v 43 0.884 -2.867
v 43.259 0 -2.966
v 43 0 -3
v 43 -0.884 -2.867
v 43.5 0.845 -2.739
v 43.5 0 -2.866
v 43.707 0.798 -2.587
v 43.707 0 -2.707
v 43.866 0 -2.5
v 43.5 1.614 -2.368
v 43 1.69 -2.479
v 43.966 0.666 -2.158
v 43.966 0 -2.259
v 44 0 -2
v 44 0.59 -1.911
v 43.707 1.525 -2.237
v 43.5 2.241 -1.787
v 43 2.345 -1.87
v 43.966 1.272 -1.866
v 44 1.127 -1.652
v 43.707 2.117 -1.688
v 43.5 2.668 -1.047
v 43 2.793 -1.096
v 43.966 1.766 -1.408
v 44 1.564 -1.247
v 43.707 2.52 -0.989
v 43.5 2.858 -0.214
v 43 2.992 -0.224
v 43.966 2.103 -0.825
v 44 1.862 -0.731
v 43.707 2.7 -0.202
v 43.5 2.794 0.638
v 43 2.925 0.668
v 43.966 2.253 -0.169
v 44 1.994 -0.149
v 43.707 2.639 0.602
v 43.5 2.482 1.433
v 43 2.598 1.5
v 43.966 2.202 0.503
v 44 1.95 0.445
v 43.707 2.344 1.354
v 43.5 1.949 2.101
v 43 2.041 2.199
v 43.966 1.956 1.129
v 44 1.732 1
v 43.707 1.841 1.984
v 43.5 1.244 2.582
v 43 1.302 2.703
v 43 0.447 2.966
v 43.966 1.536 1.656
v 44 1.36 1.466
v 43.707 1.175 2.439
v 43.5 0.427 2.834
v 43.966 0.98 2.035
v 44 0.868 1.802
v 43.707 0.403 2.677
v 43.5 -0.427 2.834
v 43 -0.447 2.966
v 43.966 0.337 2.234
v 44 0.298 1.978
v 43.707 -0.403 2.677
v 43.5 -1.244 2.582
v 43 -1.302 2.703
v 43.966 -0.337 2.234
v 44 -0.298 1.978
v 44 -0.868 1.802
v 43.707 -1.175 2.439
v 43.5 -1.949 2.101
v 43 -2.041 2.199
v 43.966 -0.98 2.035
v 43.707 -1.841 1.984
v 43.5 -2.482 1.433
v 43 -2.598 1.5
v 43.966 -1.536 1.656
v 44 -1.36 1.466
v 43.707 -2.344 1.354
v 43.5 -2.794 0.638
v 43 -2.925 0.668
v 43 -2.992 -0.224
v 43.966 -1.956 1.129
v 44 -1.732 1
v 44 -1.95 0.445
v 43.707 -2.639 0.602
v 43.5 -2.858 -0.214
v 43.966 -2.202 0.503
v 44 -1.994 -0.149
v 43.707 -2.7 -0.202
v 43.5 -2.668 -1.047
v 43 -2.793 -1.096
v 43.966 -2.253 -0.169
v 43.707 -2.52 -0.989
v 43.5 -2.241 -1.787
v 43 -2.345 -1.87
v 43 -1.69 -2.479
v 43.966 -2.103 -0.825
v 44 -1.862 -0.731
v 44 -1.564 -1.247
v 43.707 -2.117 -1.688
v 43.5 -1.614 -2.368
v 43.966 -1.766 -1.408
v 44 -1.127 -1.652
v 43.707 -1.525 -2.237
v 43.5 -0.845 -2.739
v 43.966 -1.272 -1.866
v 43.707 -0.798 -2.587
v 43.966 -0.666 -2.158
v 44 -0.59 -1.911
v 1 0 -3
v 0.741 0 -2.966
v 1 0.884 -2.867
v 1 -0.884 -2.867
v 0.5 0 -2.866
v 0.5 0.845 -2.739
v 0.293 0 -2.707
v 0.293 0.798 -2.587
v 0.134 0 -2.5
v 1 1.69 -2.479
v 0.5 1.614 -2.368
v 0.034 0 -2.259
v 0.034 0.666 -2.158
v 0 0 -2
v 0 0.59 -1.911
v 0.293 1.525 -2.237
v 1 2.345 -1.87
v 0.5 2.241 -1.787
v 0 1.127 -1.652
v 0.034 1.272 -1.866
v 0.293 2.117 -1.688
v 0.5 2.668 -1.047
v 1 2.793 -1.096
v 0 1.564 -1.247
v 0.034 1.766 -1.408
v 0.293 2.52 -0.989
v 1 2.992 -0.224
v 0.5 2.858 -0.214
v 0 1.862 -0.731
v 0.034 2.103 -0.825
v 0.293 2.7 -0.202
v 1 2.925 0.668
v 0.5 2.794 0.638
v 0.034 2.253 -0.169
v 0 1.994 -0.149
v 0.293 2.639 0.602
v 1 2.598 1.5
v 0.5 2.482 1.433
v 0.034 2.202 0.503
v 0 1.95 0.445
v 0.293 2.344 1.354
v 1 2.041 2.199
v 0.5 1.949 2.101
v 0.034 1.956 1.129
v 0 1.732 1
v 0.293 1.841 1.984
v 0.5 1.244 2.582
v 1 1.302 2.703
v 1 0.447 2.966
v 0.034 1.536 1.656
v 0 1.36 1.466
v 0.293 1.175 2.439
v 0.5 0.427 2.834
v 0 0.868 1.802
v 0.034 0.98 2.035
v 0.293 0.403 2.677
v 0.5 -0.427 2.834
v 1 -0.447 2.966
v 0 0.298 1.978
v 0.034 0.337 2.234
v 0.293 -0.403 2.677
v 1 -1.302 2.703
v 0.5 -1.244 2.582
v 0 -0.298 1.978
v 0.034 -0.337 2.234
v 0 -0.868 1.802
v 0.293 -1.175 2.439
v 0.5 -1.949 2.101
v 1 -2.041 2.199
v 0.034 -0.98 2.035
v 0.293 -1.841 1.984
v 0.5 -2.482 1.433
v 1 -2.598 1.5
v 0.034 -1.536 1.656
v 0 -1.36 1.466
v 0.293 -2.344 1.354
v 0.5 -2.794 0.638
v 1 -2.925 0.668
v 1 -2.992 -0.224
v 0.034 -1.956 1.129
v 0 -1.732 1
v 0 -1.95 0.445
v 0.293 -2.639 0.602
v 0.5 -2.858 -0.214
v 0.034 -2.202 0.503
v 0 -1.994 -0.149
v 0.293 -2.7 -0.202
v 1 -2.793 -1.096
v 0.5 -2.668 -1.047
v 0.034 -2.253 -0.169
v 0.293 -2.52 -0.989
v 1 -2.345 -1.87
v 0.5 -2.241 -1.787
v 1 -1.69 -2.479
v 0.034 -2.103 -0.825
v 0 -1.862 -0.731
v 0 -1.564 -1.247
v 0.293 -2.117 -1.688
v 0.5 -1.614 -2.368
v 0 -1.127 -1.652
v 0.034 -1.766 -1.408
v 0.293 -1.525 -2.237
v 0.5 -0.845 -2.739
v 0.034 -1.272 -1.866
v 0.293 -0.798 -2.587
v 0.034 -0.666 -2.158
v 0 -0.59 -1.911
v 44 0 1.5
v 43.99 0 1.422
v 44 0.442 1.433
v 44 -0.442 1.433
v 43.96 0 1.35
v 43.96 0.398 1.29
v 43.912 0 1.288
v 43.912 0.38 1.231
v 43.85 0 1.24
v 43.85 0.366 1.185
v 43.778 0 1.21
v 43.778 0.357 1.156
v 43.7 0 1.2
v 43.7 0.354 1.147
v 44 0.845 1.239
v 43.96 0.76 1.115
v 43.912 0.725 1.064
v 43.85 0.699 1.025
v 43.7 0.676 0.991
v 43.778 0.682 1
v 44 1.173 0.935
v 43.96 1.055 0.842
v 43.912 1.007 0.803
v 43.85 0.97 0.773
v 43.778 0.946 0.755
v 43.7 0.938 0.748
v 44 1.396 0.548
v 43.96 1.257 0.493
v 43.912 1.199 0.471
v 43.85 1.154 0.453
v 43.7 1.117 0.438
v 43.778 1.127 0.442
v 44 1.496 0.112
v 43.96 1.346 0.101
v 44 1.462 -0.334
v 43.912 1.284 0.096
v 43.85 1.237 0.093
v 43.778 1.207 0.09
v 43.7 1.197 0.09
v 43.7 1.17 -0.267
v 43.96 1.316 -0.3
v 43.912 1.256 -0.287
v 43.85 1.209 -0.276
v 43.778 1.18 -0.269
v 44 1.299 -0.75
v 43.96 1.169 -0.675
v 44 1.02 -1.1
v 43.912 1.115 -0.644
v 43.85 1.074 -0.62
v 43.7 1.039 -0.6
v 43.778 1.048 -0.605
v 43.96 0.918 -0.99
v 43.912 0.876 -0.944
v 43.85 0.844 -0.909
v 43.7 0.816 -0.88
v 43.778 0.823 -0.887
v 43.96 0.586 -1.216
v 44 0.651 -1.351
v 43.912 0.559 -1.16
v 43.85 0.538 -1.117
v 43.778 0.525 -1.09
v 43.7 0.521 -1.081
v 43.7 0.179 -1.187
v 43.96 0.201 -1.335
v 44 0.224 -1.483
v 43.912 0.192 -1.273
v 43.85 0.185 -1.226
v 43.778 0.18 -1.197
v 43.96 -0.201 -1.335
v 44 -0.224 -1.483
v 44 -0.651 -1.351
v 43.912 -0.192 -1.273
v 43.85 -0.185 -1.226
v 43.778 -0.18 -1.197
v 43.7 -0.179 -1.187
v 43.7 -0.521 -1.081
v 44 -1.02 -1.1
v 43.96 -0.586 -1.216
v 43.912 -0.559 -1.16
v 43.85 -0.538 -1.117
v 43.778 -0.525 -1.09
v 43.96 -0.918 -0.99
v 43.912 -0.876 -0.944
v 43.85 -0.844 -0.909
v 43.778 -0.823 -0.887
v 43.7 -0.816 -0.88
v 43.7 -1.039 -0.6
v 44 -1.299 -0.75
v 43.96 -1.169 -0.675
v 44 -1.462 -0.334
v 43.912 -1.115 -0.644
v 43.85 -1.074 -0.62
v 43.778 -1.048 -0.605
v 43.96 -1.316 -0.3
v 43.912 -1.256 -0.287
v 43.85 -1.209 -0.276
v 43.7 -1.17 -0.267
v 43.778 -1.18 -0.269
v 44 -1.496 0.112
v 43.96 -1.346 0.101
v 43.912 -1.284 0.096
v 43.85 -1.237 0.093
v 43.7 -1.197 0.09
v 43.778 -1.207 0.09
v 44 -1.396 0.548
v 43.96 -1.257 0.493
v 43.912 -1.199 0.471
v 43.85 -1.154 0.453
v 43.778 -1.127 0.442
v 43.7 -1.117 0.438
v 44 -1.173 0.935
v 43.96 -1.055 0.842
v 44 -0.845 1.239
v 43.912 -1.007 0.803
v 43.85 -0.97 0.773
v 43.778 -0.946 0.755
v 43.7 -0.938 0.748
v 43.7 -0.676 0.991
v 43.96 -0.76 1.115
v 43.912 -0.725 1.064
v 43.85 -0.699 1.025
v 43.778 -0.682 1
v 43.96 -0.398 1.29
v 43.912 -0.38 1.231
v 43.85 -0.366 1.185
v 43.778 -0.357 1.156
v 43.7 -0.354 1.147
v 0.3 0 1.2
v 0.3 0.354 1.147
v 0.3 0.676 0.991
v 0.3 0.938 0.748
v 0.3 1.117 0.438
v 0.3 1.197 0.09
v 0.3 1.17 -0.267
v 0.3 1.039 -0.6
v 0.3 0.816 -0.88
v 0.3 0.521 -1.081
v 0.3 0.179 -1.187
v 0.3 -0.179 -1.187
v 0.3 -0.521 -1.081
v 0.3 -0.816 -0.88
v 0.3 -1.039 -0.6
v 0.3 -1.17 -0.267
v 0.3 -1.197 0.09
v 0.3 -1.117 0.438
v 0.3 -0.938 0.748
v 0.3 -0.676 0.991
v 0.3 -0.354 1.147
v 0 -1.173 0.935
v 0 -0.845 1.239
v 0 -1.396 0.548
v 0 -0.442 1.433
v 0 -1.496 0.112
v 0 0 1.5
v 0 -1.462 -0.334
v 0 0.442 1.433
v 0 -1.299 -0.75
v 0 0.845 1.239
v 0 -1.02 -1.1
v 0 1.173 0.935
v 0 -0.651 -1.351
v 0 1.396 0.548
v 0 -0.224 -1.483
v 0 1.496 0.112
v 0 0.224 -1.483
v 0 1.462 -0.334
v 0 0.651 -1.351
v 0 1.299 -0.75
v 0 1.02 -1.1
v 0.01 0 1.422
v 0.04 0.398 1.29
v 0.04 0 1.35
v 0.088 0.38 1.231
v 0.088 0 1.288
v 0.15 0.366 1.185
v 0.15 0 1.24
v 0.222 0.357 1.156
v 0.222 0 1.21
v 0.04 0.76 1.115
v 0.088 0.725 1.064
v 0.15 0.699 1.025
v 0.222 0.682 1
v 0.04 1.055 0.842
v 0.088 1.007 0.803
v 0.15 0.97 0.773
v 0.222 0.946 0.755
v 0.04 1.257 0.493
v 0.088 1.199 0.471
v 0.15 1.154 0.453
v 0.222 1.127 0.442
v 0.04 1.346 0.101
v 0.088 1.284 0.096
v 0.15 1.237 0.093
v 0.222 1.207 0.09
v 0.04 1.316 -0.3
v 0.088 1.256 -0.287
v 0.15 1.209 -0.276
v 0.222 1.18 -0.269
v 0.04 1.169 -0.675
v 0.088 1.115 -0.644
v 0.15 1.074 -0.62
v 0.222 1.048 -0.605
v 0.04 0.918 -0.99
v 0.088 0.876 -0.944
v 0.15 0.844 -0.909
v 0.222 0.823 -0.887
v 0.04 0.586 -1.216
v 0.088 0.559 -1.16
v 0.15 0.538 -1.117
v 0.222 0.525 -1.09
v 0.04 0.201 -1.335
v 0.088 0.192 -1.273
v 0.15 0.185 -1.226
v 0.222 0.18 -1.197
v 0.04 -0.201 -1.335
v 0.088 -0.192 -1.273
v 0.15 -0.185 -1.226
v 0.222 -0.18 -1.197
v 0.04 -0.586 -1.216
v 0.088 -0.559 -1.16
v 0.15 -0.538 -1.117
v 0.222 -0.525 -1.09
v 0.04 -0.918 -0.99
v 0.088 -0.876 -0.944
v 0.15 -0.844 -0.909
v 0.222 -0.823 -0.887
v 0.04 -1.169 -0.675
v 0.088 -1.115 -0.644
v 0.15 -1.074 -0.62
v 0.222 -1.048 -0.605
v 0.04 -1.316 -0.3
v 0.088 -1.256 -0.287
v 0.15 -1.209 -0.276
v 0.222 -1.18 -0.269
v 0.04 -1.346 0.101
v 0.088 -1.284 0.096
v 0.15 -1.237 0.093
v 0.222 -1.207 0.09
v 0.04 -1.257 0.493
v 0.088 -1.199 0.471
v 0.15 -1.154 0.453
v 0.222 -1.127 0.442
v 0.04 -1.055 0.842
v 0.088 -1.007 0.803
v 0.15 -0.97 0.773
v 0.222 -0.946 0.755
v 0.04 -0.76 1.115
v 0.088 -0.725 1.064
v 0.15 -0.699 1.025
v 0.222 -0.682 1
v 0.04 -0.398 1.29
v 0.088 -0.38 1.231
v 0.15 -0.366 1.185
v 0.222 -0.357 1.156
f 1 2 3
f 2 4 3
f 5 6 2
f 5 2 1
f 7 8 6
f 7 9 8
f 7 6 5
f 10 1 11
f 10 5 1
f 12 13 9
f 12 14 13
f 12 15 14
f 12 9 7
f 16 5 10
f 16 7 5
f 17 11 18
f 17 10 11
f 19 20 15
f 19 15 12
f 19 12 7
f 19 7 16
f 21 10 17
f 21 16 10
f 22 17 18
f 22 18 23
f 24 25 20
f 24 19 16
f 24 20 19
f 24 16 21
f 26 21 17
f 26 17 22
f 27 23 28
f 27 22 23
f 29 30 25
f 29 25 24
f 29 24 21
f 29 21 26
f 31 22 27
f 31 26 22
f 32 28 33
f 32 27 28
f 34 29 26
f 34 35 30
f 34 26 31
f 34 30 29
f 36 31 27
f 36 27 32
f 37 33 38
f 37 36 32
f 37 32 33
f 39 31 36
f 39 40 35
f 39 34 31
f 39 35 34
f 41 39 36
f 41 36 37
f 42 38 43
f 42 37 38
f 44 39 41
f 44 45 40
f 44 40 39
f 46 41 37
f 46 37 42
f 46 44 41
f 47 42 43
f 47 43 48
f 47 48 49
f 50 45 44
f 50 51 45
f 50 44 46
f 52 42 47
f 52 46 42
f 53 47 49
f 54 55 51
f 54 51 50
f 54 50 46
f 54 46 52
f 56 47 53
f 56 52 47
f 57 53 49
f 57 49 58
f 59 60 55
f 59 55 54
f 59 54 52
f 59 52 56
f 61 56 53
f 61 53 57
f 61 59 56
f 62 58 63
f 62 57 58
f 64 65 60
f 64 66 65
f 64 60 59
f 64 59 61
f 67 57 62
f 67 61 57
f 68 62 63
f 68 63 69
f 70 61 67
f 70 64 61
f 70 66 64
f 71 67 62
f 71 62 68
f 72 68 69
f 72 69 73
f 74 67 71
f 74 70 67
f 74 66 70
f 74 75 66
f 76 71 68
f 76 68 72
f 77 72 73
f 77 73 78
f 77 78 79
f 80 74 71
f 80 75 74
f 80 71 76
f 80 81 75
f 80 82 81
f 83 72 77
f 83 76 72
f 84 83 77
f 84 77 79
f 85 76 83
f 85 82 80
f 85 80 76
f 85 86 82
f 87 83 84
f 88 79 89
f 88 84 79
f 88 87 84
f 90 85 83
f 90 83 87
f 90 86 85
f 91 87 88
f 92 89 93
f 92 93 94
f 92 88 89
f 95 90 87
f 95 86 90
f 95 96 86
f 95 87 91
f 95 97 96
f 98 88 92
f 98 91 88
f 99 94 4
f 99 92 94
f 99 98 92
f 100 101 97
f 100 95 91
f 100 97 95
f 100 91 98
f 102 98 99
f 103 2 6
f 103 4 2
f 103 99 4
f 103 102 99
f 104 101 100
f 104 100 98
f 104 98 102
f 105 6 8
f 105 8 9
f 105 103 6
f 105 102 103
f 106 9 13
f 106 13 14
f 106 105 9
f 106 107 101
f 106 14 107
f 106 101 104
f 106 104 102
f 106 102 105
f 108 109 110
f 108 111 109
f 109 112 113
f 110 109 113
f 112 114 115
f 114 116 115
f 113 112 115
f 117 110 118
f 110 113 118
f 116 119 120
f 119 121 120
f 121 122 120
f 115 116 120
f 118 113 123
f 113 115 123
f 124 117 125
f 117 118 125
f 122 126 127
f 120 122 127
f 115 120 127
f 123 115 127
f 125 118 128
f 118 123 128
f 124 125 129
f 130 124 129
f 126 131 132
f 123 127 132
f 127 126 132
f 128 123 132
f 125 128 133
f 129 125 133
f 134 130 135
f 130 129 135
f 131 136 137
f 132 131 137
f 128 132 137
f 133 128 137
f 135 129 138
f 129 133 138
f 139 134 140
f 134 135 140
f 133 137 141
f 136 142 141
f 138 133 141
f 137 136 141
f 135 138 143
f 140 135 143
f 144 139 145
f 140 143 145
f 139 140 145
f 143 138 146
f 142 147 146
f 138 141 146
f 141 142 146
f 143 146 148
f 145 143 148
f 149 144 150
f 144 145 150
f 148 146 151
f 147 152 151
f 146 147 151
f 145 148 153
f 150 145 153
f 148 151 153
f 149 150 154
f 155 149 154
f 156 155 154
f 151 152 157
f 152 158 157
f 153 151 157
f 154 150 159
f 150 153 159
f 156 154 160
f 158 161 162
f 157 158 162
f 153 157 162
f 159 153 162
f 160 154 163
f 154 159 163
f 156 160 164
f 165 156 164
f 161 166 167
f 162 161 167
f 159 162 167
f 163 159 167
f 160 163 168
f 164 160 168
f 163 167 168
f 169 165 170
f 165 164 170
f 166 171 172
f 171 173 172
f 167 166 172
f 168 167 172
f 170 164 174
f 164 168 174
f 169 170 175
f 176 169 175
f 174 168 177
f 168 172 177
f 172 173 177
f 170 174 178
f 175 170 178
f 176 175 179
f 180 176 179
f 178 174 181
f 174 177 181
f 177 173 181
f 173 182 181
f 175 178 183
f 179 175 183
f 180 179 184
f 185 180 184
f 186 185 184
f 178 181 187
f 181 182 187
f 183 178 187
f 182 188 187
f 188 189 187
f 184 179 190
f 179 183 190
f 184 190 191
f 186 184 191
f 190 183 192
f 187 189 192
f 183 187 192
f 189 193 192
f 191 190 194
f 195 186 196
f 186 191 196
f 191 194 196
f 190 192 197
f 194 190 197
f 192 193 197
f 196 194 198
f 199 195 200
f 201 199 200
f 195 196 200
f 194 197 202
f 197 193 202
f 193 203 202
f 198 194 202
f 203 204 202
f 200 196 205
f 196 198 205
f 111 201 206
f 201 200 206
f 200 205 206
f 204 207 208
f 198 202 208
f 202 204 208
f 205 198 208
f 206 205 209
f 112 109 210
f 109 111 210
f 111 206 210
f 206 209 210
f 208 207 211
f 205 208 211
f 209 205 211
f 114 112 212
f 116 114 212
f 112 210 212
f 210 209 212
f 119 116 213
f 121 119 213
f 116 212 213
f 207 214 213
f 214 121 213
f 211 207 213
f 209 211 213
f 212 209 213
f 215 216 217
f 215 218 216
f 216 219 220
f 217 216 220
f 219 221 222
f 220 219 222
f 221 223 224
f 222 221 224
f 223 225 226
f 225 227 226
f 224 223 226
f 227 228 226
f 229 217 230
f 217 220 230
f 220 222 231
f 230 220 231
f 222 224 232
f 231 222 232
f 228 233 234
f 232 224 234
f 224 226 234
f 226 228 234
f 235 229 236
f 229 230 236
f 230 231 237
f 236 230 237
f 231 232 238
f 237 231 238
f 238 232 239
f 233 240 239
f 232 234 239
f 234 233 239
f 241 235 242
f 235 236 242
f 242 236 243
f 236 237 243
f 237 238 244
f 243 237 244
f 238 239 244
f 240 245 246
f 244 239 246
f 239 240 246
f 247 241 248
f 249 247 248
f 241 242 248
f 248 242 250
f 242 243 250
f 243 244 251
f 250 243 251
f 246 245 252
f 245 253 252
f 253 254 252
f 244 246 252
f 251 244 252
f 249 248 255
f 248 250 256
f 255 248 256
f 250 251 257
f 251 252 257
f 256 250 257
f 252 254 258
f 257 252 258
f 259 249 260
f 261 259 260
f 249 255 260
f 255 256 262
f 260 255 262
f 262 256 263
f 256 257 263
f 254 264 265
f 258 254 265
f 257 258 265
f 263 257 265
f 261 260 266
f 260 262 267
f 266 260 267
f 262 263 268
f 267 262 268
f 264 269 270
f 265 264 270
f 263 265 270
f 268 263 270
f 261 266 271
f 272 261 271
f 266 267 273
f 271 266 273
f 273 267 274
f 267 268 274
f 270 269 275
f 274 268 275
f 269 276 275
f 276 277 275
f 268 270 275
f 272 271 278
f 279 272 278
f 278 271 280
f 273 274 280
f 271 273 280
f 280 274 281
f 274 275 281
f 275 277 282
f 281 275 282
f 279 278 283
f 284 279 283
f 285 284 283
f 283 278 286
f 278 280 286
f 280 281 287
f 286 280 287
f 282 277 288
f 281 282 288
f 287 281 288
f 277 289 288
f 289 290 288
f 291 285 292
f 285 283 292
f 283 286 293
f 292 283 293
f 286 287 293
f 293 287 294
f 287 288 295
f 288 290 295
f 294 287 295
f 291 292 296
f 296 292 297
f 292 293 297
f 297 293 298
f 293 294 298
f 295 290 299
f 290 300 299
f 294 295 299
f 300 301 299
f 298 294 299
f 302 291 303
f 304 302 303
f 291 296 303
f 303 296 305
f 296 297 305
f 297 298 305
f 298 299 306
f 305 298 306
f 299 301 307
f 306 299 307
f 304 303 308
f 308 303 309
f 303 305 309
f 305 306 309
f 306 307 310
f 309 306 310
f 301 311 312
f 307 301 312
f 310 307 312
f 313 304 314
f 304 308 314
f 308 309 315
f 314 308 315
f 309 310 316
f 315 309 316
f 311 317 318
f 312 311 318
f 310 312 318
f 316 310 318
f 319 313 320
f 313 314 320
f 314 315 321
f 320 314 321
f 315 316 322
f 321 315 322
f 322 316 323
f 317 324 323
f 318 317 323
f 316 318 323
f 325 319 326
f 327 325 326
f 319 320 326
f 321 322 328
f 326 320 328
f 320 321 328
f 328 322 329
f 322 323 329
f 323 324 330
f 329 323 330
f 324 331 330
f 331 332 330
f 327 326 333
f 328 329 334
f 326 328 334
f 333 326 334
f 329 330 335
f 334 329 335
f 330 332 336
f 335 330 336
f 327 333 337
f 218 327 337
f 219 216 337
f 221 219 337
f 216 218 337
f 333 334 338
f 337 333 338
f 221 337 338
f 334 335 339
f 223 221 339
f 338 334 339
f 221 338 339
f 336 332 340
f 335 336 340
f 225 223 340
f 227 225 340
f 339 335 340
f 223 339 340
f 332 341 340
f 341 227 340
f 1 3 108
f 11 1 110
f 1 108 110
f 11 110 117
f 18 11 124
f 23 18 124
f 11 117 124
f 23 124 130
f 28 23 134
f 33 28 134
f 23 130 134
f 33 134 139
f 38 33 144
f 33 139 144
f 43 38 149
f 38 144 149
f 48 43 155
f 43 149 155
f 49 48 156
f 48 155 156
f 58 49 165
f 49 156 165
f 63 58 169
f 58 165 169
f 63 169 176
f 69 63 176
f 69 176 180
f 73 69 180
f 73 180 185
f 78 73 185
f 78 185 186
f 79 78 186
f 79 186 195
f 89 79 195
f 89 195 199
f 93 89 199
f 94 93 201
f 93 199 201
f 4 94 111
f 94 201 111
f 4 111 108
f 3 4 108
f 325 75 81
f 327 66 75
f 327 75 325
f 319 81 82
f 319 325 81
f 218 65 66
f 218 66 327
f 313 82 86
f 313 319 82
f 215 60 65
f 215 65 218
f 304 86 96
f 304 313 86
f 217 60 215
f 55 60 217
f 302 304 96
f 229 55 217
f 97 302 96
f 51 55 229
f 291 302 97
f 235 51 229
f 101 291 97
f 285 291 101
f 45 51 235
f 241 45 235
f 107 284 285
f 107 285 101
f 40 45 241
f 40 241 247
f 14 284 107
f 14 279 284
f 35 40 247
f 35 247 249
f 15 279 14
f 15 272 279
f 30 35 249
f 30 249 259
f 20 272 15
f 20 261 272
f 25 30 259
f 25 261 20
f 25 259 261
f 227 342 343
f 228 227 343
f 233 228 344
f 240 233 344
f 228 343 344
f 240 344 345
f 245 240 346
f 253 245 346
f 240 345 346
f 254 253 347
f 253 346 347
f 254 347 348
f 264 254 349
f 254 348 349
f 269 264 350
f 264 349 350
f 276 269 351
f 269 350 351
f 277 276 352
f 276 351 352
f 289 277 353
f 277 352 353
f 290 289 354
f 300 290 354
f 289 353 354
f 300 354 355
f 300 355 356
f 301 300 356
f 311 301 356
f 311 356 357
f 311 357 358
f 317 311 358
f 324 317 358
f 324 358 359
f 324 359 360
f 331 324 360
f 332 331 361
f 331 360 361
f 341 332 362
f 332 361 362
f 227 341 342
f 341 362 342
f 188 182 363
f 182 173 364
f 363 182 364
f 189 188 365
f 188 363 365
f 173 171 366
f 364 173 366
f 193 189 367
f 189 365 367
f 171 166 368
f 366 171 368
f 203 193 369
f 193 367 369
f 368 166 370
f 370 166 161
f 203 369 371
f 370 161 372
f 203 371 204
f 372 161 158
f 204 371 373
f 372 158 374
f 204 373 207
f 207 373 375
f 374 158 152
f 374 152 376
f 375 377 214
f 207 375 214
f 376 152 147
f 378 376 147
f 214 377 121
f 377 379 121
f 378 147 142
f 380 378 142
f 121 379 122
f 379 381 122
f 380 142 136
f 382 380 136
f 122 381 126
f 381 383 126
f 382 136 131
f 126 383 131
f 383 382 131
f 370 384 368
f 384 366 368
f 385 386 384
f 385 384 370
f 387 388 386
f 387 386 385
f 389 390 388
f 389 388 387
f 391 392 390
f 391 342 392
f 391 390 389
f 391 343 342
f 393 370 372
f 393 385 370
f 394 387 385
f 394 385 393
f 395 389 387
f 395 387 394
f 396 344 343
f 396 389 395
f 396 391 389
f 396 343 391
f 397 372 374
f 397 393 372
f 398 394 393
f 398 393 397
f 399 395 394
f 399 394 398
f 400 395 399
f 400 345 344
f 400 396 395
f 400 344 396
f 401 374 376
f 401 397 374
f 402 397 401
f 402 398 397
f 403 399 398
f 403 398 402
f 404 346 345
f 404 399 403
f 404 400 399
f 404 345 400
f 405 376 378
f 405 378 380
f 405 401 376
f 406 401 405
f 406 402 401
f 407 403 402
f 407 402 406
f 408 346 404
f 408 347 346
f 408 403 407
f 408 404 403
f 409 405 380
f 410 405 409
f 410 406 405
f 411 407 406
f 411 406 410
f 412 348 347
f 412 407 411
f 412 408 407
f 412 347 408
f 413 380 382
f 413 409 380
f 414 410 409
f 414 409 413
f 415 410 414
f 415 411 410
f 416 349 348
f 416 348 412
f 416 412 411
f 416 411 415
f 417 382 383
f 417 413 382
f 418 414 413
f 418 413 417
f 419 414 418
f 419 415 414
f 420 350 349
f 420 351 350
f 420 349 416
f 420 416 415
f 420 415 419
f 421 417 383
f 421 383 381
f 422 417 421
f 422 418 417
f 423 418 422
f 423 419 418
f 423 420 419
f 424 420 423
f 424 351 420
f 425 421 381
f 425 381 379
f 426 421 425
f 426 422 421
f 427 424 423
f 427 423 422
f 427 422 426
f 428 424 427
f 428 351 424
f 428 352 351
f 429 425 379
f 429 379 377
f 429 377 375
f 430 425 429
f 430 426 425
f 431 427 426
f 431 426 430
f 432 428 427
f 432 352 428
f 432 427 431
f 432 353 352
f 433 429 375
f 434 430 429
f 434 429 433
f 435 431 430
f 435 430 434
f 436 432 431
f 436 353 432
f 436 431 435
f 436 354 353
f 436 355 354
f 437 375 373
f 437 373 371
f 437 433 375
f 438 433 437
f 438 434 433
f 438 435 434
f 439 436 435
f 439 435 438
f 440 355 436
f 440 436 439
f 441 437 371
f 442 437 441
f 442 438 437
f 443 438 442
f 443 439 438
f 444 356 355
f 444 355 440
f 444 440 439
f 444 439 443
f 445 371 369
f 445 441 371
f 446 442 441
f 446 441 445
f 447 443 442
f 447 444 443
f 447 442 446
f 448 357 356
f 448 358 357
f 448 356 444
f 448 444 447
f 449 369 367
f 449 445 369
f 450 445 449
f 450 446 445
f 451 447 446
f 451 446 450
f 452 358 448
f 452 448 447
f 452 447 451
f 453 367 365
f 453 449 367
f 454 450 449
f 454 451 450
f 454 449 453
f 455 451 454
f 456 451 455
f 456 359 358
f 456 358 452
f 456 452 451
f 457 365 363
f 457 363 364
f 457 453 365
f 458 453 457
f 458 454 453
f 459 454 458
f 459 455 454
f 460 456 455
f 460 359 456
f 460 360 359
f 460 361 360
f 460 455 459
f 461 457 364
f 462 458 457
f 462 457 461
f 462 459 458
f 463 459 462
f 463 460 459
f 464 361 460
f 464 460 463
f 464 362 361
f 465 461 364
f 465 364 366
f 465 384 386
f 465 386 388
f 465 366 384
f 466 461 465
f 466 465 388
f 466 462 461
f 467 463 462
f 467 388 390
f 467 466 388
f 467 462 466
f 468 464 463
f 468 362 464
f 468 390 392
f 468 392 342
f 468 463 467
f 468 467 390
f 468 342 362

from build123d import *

# Parameters (mm, degrees)
SKETCH_1_R          = 3
EXTRUDE_1_DEPTH     = 44
SKETCH_2_R          = 1.2
CUT_EXTRUDE_1_DEPTH = 44
FILLET_1_R          = 1
FILLET_2_R          = 0.3


with BuildPart() as part:
    # 草图1 → 凸台-拉伸1 (new body)
    with BuildSketch(Plane(origin=(0, 0, 0), x_dir=(0, 0, -1), z_dir=(1, 0, 0))):
        Circle(SKETCH_1_R)
    extrude(amount=EXTRUDE_1_DEPTH)

    # 草图2 → 切除-拉伸1 (cut)
    with BuildSketch(Plane.ZY):
        Circle(SKETCH_2_R)
    extrude(amount=-CUT_EXTRUDE_1_DEPTH, mode=Mode.SUBTRACT)

    # 圆角1
    fillet_1_edges = [part.edges().sort_by_distance(p)[0] for p in [
        (0, 0, 3),
        (44, 0, 3),
    ]]
    fillet(fillet_1_edges, radius=FILLET_1_R)

    # 圆角2
    fillet_2_edges = [part.edges().sort_by_distance(p)[0] for p in [
        (44, 0, -1.2),
        (0, 0, -1.2),
    ]]
    fillet(fillet_2_edges, radius=FILLET_2_R)


solid = part.part
